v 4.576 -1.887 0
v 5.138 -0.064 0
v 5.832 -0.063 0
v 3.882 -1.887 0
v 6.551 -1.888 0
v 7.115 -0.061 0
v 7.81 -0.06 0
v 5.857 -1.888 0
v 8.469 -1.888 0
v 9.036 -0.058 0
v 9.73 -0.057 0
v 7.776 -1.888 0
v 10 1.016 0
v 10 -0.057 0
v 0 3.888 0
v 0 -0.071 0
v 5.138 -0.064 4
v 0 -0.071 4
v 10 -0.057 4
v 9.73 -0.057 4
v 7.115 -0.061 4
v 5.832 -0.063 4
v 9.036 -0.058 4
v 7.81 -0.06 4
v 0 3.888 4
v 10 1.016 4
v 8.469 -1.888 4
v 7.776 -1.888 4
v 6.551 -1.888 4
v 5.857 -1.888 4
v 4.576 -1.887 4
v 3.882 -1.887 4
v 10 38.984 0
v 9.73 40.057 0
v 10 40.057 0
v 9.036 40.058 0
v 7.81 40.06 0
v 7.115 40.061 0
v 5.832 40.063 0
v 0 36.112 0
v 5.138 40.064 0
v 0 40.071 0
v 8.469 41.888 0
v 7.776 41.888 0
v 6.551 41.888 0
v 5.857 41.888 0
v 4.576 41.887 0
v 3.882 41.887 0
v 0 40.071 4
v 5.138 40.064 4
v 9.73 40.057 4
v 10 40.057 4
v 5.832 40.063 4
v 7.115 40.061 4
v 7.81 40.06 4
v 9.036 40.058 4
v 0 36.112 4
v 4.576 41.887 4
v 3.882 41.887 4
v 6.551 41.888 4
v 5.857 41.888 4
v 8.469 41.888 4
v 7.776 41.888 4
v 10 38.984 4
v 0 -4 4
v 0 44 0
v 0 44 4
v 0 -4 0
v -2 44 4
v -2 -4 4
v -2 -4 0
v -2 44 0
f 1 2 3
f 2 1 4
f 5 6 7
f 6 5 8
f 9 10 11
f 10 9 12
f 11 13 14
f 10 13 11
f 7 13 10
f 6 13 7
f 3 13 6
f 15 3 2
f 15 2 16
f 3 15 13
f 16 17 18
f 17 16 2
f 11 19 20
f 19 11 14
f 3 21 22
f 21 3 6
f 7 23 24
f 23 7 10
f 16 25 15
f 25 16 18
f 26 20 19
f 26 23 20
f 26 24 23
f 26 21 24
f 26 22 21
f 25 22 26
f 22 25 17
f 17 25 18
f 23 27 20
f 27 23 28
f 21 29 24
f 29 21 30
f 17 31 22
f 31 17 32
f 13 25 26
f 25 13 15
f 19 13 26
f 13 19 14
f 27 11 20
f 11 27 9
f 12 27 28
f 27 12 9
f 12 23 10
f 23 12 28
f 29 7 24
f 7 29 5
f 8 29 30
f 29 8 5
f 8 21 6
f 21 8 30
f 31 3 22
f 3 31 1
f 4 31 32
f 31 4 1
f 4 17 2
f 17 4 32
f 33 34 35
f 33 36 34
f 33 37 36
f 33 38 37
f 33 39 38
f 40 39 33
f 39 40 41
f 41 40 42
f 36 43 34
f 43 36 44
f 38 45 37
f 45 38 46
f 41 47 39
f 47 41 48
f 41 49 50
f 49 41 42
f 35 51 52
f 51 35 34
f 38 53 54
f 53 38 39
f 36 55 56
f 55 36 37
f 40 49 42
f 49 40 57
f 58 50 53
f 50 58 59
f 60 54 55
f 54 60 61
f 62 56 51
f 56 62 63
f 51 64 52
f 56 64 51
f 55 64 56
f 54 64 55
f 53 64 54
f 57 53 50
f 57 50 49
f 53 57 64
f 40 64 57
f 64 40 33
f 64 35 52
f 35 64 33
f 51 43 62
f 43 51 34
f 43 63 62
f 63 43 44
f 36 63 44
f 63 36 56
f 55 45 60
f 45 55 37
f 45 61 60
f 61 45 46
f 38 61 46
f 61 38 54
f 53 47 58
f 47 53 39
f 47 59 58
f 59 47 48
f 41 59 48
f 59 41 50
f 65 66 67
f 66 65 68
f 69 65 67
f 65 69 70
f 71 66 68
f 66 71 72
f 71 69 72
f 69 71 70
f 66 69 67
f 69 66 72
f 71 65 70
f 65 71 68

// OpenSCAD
/*
	name: 		fixme-price-list-stop.scad
	author:	Aymeric B.
	date:		05.09.2014
*/


/****** PARAMETERS ****/
$fn = 50;
_thickness = 2;
_clearance = 0.1;

_frame_height = 40;
_frame_width = 25;
_cleat_size = 4;
_cleat_elevation = 4;
_elevation = 5;


/****** MODULES ****/
module InnerPart(width, height, thickness) {
	scale([width, height, 1]) {
		translate([0.5, -0.1, 0]) {
			scale([1/61.871844, -1/61.871844, 1]) union()
			{
				linear_extrude(height=thickness)
					polygon([[-30.935922,-6.629086],[30.935922,-6.539796],[30.935922,0.099260],[-30.935922,17.867117]]);
				linear_extrude(height=thickness)
					polygon([[17.172659,-17.866952],[21.465809,-17.866952],[29.294451,-6.502795],[25.001301,-6.502795]]);
				linear_extrude(height=thickness)
					polygon([[5.303226,-17.867117],[9.596376,-17.867117],[17.425074,-6.502877],[13.131924,-6.502877]]);
				linear_extrude(height=thickness)
					polygon([[-6.917324,-17.861847],[-2.624174,-17.861847],[5.204525,-6.497607],[0.911375,-6.497607]]);
		}
		}
	}
}

module OuterPart(width, height, elevation) {
	cube([width, height, elevation]);
}

module Draw() {
	translate([-_thickness, -_cleat_size, 0]) {
		OuterPart(_thickness, _frame_height+2*_cleat_size, _cleat_elevation);
	}
	translate([0, _thickness/2-1, 0]) {
		scale([1, -1, 1]) {
			InnerPart(10, 10, _cleat_elevation);
		}
	}
	translate([0, _frame_height+1-_thickness/2, 0]) {
		InnerPart(10, 10, _cleat_elevation);
	}
}

/****** RENDERS ****/
Draw();
